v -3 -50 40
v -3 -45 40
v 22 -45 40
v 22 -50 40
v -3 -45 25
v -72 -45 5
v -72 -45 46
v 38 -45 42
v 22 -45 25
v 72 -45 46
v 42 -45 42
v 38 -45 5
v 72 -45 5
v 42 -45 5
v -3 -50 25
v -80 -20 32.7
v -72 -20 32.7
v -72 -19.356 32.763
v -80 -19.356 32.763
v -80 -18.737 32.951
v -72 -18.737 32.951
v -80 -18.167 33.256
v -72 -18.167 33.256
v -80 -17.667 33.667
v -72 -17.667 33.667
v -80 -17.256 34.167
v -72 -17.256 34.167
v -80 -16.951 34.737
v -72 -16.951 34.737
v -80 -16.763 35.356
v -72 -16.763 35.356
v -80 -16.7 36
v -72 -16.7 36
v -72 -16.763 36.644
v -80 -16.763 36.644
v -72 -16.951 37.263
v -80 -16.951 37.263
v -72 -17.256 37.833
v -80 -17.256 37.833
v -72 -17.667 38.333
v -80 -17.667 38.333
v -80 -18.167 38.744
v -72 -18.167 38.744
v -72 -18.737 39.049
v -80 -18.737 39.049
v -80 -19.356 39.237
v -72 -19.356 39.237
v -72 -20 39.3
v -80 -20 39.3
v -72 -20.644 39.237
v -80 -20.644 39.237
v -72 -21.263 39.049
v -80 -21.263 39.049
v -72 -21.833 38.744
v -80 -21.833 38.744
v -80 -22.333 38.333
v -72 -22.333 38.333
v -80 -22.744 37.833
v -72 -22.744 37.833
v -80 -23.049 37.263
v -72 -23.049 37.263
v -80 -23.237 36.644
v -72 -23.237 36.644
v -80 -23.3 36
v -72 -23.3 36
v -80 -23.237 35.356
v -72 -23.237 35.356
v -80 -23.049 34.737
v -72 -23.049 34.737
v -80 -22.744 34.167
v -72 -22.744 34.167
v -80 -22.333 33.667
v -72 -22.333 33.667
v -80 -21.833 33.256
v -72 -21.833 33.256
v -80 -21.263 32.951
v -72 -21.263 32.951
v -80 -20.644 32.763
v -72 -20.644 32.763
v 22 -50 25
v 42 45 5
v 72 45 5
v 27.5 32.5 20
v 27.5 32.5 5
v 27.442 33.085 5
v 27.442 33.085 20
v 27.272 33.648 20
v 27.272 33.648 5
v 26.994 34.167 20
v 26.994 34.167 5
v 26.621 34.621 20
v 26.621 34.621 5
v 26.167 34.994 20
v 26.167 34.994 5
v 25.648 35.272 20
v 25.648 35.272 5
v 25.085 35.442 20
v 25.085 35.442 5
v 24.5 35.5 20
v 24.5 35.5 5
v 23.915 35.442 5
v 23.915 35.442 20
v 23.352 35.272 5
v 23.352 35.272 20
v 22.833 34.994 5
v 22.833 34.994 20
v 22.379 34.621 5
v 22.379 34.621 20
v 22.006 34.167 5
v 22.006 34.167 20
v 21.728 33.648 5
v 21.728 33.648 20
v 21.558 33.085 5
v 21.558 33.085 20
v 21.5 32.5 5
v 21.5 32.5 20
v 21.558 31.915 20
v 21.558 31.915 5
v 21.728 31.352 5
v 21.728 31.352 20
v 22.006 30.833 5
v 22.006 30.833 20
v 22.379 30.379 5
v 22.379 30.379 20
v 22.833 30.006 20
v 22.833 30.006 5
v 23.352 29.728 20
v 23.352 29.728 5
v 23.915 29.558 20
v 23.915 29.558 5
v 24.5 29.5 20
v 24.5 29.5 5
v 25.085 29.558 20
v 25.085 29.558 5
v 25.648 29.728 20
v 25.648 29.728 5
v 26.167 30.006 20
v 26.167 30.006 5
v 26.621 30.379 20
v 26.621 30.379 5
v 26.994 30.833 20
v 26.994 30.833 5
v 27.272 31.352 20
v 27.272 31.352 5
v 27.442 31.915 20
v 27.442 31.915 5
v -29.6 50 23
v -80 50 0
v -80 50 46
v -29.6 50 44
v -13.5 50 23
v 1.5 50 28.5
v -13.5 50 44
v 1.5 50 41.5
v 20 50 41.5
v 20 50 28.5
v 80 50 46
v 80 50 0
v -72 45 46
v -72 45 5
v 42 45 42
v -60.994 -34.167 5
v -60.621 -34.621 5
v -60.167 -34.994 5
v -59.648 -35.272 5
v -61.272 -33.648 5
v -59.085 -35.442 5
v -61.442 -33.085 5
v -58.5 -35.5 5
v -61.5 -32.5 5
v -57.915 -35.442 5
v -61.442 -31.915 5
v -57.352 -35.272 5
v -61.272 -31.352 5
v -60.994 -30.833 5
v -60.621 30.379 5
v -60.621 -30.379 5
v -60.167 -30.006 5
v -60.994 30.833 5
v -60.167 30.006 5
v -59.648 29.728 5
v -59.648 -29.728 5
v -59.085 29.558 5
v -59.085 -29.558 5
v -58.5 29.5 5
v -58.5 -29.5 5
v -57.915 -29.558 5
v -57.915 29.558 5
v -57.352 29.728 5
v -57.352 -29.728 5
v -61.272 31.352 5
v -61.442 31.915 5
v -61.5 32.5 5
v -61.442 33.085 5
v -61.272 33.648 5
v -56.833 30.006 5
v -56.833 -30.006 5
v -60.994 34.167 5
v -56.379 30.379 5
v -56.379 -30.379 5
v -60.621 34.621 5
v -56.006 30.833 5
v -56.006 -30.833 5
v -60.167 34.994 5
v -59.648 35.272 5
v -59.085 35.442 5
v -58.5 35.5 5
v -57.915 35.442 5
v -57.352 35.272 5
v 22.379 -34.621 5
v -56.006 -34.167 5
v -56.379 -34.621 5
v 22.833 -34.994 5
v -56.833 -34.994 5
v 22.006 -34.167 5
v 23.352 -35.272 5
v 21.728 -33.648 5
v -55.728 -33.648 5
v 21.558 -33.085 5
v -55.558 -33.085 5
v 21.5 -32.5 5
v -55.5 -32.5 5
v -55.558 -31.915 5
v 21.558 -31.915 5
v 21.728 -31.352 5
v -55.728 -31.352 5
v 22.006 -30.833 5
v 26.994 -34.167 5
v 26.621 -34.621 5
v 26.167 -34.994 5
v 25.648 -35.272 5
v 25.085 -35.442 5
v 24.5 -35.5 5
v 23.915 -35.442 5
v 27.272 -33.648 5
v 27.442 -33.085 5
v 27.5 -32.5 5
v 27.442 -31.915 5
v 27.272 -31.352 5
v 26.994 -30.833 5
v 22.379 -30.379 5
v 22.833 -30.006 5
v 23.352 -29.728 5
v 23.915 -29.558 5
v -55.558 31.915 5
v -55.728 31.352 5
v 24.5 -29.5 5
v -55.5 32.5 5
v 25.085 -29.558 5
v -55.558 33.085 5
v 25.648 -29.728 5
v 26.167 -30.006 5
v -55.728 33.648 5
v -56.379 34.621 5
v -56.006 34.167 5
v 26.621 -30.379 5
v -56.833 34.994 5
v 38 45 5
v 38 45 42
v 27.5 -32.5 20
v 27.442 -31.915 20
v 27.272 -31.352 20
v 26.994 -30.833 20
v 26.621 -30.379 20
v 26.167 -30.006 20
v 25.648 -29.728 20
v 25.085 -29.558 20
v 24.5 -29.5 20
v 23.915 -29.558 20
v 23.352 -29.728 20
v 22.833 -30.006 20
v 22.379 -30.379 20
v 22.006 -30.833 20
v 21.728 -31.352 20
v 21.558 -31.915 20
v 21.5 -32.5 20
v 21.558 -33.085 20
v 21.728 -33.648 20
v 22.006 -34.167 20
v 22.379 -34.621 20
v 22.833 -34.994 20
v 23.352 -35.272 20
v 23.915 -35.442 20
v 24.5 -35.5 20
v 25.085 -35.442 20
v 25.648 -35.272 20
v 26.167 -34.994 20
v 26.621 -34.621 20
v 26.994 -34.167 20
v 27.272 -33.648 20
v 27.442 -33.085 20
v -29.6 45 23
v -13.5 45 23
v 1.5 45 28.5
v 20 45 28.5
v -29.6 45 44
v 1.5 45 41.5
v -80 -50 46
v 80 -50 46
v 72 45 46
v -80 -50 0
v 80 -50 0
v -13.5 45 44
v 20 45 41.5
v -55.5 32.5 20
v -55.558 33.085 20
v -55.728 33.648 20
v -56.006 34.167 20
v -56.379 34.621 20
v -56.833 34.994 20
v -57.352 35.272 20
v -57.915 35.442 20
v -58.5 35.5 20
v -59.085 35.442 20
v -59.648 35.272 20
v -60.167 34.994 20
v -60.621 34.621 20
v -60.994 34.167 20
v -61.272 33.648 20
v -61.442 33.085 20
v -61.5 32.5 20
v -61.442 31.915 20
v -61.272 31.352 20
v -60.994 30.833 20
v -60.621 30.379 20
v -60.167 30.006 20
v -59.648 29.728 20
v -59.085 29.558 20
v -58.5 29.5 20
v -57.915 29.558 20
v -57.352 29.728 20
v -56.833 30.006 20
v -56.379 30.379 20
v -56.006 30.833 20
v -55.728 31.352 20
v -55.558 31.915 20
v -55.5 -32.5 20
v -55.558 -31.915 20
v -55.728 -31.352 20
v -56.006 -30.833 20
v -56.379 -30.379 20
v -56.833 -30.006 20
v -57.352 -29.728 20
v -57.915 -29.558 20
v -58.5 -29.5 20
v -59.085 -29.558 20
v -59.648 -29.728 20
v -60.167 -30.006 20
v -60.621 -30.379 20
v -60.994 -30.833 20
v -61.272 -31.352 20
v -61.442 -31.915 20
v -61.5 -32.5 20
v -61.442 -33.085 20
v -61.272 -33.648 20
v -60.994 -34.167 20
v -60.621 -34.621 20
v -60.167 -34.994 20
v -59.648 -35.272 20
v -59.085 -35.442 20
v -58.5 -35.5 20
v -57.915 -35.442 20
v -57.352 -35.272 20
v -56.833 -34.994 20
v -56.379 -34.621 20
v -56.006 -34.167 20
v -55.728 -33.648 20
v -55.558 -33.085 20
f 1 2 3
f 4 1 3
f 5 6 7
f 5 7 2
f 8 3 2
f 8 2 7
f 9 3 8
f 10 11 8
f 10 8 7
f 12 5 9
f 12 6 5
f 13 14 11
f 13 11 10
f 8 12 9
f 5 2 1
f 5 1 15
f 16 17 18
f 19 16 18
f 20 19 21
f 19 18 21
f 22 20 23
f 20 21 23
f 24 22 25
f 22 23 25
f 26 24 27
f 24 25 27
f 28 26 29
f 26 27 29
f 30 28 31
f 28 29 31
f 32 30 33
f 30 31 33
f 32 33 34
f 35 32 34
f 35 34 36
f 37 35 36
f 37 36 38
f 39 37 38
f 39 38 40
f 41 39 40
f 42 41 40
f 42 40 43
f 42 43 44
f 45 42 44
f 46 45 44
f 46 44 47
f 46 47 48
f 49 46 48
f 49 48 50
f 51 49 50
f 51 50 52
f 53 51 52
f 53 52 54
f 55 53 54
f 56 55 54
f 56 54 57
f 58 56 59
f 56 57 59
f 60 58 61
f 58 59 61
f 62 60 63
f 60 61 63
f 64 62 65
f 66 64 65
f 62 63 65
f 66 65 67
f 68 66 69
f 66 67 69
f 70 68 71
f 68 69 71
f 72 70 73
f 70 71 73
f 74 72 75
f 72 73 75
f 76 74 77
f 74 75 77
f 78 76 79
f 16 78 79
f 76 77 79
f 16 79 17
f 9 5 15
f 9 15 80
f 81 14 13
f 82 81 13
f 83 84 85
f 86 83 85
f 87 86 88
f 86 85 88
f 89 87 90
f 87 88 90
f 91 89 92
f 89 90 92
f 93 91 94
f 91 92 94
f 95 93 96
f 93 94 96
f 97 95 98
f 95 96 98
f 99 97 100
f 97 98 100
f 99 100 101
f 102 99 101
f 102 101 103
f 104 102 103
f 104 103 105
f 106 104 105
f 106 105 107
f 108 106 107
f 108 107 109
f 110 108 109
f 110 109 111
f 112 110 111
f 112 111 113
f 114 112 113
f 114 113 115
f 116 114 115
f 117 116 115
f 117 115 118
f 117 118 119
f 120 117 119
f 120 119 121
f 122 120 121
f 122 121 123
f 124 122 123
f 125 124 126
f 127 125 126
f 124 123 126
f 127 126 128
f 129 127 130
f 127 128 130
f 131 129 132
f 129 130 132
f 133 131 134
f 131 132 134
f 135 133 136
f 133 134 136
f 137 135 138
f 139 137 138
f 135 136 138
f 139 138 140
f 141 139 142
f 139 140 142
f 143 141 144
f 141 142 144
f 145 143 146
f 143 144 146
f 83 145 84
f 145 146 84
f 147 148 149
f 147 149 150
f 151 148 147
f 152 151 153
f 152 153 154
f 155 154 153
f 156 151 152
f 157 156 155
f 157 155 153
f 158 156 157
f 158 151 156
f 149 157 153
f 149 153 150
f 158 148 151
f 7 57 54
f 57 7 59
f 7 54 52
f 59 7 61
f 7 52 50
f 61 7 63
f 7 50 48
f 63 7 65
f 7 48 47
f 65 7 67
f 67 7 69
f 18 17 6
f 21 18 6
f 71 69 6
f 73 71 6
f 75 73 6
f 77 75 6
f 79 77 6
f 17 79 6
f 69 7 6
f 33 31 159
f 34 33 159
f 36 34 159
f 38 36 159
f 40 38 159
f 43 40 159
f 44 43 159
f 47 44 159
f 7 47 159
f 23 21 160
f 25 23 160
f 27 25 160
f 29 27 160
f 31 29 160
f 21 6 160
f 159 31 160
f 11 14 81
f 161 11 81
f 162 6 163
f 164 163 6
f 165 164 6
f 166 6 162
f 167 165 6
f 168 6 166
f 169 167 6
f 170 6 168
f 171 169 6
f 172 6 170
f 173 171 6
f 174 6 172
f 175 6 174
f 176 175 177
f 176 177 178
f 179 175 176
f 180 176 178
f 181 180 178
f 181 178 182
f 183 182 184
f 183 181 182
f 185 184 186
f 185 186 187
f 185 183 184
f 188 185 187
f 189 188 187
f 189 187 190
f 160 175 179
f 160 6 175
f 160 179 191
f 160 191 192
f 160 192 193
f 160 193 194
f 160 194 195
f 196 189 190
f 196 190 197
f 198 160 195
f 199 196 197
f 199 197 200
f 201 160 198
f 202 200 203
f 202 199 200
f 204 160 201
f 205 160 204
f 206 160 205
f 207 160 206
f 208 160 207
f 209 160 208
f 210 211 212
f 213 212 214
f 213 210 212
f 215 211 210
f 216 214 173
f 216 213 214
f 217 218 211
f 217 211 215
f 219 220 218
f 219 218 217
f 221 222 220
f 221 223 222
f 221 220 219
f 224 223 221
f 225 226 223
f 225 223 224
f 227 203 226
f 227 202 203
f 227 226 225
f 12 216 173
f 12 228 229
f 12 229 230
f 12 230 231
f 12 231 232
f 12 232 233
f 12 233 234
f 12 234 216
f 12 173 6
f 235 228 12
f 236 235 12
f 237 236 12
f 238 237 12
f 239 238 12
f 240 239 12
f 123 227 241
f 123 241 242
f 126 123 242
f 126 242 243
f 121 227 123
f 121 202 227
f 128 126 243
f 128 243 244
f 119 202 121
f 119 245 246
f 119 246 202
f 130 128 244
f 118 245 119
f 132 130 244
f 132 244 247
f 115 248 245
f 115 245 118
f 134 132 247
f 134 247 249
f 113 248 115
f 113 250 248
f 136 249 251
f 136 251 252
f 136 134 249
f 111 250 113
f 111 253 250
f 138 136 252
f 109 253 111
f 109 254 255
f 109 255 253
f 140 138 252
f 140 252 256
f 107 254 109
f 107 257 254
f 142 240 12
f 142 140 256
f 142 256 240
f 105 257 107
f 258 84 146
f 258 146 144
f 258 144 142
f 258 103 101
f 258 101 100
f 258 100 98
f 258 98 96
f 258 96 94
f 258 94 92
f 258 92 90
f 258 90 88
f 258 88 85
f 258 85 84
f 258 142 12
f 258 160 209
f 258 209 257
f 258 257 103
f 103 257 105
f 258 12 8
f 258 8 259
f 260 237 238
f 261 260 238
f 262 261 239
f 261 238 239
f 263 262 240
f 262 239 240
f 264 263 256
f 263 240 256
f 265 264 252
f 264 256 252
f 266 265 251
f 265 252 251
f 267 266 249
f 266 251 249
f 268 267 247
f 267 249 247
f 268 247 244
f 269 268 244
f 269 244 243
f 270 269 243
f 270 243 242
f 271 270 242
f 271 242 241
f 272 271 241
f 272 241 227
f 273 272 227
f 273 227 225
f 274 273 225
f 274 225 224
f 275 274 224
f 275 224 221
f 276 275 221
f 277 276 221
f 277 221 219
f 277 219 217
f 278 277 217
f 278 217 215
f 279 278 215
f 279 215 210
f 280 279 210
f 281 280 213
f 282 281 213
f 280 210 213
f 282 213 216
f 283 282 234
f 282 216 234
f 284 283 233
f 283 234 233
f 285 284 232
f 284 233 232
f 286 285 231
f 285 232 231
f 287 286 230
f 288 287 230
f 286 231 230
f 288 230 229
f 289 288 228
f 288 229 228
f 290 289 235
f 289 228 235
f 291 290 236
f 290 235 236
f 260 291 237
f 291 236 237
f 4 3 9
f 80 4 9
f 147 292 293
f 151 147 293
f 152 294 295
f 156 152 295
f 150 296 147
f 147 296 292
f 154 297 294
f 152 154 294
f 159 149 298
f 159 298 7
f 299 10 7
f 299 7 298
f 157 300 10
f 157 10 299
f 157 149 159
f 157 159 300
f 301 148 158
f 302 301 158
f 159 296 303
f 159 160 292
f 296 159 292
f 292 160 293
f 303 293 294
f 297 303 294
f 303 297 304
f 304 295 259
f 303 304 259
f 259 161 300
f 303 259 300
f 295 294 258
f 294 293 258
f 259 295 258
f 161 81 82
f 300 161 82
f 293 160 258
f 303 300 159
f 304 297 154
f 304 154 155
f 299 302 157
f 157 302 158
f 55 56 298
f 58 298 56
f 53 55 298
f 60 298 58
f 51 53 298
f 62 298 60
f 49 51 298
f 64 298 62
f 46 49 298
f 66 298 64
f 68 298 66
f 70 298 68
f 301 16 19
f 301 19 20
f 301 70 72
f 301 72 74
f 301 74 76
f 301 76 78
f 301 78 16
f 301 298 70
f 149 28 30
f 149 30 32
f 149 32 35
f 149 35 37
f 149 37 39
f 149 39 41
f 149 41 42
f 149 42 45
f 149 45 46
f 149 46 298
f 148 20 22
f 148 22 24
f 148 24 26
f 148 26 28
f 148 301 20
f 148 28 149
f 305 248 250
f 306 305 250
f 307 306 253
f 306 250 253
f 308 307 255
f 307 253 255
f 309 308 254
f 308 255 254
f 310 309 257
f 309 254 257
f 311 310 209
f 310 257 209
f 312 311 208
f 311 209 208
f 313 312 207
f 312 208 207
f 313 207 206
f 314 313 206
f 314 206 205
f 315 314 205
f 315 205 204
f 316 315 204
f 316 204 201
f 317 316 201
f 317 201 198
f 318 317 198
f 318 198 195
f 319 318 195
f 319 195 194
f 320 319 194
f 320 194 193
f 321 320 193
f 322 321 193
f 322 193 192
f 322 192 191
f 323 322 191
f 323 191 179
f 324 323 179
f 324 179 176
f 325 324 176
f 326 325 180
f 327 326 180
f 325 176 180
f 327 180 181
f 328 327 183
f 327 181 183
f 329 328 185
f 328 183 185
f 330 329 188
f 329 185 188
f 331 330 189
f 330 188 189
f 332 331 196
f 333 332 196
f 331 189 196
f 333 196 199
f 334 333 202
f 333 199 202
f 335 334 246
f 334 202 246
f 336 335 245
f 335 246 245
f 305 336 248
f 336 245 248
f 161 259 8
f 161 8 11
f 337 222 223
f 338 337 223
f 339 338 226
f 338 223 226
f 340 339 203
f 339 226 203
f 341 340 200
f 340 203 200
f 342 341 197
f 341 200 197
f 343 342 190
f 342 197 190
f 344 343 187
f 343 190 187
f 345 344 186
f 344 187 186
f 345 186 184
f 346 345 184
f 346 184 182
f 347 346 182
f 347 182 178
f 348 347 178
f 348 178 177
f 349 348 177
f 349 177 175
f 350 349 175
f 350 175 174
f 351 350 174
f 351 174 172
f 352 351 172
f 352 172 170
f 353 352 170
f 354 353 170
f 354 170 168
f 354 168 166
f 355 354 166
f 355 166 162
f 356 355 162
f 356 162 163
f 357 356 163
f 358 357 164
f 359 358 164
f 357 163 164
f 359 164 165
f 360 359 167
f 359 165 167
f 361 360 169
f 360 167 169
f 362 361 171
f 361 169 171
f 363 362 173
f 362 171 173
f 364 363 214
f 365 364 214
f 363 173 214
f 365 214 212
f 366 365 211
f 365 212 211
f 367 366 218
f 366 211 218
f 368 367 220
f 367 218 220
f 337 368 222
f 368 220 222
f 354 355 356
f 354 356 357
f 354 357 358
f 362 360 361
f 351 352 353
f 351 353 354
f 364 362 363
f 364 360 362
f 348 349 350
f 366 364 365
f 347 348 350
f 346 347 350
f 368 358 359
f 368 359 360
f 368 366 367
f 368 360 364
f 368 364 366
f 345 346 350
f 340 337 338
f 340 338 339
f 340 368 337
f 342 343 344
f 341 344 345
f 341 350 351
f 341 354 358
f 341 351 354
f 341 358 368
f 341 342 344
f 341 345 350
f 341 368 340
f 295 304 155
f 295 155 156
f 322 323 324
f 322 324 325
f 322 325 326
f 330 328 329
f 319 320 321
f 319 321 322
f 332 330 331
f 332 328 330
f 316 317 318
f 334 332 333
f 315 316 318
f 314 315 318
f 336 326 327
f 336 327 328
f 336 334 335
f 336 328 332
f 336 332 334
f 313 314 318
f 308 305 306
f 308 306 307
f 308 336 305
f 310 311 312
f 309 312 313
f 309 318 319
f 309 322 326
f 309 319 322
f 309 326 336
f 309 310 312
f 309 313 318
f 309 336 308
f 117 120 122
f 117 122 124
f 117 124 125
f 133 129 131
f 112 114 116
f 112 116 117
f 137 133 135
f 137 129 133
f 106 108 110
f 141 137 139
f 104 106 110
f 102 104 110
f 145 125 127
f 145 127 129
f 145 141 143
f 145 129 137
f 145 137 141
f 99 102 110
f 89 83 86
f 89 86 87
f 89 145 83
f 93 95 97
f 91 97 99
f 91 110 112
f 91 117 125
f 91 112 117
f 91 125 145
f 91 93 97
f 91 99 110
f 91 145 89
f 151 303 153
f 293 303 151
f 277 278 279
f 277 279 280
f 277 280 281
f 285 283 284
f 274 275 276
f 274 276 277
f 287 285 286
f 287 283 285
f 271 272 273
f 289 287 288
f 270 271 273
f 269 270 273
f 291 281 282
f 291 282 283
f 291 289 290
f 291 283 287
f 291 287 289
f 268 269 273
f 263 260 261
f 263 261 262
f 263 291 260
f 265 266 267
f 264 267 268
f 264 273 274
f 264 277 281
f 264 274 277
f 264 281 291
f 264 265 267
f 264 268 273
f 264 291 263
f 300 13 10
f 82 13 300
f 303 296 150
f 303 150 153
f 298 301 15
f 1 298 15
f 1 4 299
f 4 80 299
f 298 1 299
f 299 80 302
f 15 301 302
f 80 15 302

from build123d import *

# Parameters (mm, degrees)
ESQUISSE1_W                       = 160
ESQUISSE1_H                       = 100
ESQUISSE1_W_2                     = 144
ESQUISSE1_H_2                     = 90
PROFONDEUR_BOITIER_DEPTH          = 46
ESQUISSE2_W                       = 144
ESQUISSE2_H                       = 90
PROFONDEUR_FOND_DEPTH             = 5
ESQUISSE3_W                       = 4
ESQUISSE3_H                       = 90
S_PARATION_PLATINE_BATTERIE_DEPTH = 42
ESQUISSE7_R                       = 3.3
ANTENNE_LORA_DEPTH                = 92
ESQUISSE8_W                       = 18.5
ESQUISSE8_H                       = 13
INTERRUPTEUR_DEPTH                = 92
ESQUISSE9_R                       = 3
VIS_PLATINE_DEPTH                 = 20
ESQUISSE10_W                      = 16.1
ESQUISSE10_H                      = 21
DHT22_DEPTH                       = 92
ESQUISSE11_W                      = 25
ESQUISSE11_H                      = 15
DB9_DEPTH                         = 92


with BuildPart() as part:
    # Esquisse1 → profondeur boitier (new body)
    with BuildSketch(Plane.XY):
        Rectangle(ESQUISSE1_W, ESQUISSE1_H)
        Rectangle(ESQUISSE1_W_2, ESQUISSE1_H_2, mode=Mode.SUBTRACT)
    extrude(amount=PROFONDEUR_BOITIER_DEPTH)

    # Esquisse2 → profondeur fond (add)
    with BuildSketch(Plane.XY):
        Rectangle(ESQUISSE2_W, ESQUISSE2_H)
    extrude(amount=PROFONDEUR_FOND_DEPTH)

    # Esquisse3 → Séparation platine batterie (add)
    with BuildSketch(Plane.XY):
        with Locations((40, 0)):
            Rectangle(ESQUISSE3_W, ESQUISSE3_H)
    extrude(amount=S_PARATION_PLATINE_BATTERIE_DEPTH)

    # Esquisse7 → Antenne LoRA (cut)
    with BuildSketch(Plane(origin=(0, 0, 0), x_dir=(0, 0, -1), z_dir=(1, 0, 0))):
        with Locations((-36, -20)):
            Circle(ESQUISSE7_R)
    extrude(amount=-ANTENNE_LORA_DEPTH, mode=Mode.SUBTRACT)

    # Esquisse8 → interrupteur (cut)
    with BuildSketch(Plane(origin=(0, 0, 0), x_dir=(1, 0, 0), z_dir=(0, 1, 0))):
        with Locations((10.75, -35)):
            Rectangle(ESQUISSE8_W, ESQUISSE8_H)
    extrude(amount=INTERRUPTEUR_DEPTH, mode=Mode.SUBTRACT)

    # Esquisse9 → Vis platine (add)
    with BuildSketch(Plane.XY):
        with Locations((-58.5, -32.5)):
            Circle(ESQUISSE9_R)
        with Locations((24.5, -32.5)):
            Circle(ESQUISSE9_R)
        with Locations((24.5, 32.5)):
            Circle(ESQUISSE9_R)
        with Locations((-58.5, 32.5)):
            Circle(ESQUISSE9_R)
    extrude(amount=VIS_PLATINE_DEPTH)

    # Esquisse10 → DHT22 (cut)
    with BuildSketch(Plane(origin=(0, 0, 0), x_dir=(1, 0, 0), z_dir=(0, 1, 0))):
        with Locations((-21.55, -33.5)):
            Rectangle(ESQUISSE10_W, ESQUISSE10_H)
    extrude(amount=DHT22_DEPTH, mode=Mode.SUBTRACT)

    # Esquisse11 → DB9 (cut)
    with BuildSketch(Plane(origin=(0, 0, 0), x_dir=(1, 0, 0), z_dir=(0, 1, 0))):
        with Locations((9.5, -32.5)):
            Rectangle(ESQUISSE11_W, ESQUISSE11_H)
    extrude(amount=-DB9_DEPTH, mode=Mode.SUBTRACT)


solid = part.part
